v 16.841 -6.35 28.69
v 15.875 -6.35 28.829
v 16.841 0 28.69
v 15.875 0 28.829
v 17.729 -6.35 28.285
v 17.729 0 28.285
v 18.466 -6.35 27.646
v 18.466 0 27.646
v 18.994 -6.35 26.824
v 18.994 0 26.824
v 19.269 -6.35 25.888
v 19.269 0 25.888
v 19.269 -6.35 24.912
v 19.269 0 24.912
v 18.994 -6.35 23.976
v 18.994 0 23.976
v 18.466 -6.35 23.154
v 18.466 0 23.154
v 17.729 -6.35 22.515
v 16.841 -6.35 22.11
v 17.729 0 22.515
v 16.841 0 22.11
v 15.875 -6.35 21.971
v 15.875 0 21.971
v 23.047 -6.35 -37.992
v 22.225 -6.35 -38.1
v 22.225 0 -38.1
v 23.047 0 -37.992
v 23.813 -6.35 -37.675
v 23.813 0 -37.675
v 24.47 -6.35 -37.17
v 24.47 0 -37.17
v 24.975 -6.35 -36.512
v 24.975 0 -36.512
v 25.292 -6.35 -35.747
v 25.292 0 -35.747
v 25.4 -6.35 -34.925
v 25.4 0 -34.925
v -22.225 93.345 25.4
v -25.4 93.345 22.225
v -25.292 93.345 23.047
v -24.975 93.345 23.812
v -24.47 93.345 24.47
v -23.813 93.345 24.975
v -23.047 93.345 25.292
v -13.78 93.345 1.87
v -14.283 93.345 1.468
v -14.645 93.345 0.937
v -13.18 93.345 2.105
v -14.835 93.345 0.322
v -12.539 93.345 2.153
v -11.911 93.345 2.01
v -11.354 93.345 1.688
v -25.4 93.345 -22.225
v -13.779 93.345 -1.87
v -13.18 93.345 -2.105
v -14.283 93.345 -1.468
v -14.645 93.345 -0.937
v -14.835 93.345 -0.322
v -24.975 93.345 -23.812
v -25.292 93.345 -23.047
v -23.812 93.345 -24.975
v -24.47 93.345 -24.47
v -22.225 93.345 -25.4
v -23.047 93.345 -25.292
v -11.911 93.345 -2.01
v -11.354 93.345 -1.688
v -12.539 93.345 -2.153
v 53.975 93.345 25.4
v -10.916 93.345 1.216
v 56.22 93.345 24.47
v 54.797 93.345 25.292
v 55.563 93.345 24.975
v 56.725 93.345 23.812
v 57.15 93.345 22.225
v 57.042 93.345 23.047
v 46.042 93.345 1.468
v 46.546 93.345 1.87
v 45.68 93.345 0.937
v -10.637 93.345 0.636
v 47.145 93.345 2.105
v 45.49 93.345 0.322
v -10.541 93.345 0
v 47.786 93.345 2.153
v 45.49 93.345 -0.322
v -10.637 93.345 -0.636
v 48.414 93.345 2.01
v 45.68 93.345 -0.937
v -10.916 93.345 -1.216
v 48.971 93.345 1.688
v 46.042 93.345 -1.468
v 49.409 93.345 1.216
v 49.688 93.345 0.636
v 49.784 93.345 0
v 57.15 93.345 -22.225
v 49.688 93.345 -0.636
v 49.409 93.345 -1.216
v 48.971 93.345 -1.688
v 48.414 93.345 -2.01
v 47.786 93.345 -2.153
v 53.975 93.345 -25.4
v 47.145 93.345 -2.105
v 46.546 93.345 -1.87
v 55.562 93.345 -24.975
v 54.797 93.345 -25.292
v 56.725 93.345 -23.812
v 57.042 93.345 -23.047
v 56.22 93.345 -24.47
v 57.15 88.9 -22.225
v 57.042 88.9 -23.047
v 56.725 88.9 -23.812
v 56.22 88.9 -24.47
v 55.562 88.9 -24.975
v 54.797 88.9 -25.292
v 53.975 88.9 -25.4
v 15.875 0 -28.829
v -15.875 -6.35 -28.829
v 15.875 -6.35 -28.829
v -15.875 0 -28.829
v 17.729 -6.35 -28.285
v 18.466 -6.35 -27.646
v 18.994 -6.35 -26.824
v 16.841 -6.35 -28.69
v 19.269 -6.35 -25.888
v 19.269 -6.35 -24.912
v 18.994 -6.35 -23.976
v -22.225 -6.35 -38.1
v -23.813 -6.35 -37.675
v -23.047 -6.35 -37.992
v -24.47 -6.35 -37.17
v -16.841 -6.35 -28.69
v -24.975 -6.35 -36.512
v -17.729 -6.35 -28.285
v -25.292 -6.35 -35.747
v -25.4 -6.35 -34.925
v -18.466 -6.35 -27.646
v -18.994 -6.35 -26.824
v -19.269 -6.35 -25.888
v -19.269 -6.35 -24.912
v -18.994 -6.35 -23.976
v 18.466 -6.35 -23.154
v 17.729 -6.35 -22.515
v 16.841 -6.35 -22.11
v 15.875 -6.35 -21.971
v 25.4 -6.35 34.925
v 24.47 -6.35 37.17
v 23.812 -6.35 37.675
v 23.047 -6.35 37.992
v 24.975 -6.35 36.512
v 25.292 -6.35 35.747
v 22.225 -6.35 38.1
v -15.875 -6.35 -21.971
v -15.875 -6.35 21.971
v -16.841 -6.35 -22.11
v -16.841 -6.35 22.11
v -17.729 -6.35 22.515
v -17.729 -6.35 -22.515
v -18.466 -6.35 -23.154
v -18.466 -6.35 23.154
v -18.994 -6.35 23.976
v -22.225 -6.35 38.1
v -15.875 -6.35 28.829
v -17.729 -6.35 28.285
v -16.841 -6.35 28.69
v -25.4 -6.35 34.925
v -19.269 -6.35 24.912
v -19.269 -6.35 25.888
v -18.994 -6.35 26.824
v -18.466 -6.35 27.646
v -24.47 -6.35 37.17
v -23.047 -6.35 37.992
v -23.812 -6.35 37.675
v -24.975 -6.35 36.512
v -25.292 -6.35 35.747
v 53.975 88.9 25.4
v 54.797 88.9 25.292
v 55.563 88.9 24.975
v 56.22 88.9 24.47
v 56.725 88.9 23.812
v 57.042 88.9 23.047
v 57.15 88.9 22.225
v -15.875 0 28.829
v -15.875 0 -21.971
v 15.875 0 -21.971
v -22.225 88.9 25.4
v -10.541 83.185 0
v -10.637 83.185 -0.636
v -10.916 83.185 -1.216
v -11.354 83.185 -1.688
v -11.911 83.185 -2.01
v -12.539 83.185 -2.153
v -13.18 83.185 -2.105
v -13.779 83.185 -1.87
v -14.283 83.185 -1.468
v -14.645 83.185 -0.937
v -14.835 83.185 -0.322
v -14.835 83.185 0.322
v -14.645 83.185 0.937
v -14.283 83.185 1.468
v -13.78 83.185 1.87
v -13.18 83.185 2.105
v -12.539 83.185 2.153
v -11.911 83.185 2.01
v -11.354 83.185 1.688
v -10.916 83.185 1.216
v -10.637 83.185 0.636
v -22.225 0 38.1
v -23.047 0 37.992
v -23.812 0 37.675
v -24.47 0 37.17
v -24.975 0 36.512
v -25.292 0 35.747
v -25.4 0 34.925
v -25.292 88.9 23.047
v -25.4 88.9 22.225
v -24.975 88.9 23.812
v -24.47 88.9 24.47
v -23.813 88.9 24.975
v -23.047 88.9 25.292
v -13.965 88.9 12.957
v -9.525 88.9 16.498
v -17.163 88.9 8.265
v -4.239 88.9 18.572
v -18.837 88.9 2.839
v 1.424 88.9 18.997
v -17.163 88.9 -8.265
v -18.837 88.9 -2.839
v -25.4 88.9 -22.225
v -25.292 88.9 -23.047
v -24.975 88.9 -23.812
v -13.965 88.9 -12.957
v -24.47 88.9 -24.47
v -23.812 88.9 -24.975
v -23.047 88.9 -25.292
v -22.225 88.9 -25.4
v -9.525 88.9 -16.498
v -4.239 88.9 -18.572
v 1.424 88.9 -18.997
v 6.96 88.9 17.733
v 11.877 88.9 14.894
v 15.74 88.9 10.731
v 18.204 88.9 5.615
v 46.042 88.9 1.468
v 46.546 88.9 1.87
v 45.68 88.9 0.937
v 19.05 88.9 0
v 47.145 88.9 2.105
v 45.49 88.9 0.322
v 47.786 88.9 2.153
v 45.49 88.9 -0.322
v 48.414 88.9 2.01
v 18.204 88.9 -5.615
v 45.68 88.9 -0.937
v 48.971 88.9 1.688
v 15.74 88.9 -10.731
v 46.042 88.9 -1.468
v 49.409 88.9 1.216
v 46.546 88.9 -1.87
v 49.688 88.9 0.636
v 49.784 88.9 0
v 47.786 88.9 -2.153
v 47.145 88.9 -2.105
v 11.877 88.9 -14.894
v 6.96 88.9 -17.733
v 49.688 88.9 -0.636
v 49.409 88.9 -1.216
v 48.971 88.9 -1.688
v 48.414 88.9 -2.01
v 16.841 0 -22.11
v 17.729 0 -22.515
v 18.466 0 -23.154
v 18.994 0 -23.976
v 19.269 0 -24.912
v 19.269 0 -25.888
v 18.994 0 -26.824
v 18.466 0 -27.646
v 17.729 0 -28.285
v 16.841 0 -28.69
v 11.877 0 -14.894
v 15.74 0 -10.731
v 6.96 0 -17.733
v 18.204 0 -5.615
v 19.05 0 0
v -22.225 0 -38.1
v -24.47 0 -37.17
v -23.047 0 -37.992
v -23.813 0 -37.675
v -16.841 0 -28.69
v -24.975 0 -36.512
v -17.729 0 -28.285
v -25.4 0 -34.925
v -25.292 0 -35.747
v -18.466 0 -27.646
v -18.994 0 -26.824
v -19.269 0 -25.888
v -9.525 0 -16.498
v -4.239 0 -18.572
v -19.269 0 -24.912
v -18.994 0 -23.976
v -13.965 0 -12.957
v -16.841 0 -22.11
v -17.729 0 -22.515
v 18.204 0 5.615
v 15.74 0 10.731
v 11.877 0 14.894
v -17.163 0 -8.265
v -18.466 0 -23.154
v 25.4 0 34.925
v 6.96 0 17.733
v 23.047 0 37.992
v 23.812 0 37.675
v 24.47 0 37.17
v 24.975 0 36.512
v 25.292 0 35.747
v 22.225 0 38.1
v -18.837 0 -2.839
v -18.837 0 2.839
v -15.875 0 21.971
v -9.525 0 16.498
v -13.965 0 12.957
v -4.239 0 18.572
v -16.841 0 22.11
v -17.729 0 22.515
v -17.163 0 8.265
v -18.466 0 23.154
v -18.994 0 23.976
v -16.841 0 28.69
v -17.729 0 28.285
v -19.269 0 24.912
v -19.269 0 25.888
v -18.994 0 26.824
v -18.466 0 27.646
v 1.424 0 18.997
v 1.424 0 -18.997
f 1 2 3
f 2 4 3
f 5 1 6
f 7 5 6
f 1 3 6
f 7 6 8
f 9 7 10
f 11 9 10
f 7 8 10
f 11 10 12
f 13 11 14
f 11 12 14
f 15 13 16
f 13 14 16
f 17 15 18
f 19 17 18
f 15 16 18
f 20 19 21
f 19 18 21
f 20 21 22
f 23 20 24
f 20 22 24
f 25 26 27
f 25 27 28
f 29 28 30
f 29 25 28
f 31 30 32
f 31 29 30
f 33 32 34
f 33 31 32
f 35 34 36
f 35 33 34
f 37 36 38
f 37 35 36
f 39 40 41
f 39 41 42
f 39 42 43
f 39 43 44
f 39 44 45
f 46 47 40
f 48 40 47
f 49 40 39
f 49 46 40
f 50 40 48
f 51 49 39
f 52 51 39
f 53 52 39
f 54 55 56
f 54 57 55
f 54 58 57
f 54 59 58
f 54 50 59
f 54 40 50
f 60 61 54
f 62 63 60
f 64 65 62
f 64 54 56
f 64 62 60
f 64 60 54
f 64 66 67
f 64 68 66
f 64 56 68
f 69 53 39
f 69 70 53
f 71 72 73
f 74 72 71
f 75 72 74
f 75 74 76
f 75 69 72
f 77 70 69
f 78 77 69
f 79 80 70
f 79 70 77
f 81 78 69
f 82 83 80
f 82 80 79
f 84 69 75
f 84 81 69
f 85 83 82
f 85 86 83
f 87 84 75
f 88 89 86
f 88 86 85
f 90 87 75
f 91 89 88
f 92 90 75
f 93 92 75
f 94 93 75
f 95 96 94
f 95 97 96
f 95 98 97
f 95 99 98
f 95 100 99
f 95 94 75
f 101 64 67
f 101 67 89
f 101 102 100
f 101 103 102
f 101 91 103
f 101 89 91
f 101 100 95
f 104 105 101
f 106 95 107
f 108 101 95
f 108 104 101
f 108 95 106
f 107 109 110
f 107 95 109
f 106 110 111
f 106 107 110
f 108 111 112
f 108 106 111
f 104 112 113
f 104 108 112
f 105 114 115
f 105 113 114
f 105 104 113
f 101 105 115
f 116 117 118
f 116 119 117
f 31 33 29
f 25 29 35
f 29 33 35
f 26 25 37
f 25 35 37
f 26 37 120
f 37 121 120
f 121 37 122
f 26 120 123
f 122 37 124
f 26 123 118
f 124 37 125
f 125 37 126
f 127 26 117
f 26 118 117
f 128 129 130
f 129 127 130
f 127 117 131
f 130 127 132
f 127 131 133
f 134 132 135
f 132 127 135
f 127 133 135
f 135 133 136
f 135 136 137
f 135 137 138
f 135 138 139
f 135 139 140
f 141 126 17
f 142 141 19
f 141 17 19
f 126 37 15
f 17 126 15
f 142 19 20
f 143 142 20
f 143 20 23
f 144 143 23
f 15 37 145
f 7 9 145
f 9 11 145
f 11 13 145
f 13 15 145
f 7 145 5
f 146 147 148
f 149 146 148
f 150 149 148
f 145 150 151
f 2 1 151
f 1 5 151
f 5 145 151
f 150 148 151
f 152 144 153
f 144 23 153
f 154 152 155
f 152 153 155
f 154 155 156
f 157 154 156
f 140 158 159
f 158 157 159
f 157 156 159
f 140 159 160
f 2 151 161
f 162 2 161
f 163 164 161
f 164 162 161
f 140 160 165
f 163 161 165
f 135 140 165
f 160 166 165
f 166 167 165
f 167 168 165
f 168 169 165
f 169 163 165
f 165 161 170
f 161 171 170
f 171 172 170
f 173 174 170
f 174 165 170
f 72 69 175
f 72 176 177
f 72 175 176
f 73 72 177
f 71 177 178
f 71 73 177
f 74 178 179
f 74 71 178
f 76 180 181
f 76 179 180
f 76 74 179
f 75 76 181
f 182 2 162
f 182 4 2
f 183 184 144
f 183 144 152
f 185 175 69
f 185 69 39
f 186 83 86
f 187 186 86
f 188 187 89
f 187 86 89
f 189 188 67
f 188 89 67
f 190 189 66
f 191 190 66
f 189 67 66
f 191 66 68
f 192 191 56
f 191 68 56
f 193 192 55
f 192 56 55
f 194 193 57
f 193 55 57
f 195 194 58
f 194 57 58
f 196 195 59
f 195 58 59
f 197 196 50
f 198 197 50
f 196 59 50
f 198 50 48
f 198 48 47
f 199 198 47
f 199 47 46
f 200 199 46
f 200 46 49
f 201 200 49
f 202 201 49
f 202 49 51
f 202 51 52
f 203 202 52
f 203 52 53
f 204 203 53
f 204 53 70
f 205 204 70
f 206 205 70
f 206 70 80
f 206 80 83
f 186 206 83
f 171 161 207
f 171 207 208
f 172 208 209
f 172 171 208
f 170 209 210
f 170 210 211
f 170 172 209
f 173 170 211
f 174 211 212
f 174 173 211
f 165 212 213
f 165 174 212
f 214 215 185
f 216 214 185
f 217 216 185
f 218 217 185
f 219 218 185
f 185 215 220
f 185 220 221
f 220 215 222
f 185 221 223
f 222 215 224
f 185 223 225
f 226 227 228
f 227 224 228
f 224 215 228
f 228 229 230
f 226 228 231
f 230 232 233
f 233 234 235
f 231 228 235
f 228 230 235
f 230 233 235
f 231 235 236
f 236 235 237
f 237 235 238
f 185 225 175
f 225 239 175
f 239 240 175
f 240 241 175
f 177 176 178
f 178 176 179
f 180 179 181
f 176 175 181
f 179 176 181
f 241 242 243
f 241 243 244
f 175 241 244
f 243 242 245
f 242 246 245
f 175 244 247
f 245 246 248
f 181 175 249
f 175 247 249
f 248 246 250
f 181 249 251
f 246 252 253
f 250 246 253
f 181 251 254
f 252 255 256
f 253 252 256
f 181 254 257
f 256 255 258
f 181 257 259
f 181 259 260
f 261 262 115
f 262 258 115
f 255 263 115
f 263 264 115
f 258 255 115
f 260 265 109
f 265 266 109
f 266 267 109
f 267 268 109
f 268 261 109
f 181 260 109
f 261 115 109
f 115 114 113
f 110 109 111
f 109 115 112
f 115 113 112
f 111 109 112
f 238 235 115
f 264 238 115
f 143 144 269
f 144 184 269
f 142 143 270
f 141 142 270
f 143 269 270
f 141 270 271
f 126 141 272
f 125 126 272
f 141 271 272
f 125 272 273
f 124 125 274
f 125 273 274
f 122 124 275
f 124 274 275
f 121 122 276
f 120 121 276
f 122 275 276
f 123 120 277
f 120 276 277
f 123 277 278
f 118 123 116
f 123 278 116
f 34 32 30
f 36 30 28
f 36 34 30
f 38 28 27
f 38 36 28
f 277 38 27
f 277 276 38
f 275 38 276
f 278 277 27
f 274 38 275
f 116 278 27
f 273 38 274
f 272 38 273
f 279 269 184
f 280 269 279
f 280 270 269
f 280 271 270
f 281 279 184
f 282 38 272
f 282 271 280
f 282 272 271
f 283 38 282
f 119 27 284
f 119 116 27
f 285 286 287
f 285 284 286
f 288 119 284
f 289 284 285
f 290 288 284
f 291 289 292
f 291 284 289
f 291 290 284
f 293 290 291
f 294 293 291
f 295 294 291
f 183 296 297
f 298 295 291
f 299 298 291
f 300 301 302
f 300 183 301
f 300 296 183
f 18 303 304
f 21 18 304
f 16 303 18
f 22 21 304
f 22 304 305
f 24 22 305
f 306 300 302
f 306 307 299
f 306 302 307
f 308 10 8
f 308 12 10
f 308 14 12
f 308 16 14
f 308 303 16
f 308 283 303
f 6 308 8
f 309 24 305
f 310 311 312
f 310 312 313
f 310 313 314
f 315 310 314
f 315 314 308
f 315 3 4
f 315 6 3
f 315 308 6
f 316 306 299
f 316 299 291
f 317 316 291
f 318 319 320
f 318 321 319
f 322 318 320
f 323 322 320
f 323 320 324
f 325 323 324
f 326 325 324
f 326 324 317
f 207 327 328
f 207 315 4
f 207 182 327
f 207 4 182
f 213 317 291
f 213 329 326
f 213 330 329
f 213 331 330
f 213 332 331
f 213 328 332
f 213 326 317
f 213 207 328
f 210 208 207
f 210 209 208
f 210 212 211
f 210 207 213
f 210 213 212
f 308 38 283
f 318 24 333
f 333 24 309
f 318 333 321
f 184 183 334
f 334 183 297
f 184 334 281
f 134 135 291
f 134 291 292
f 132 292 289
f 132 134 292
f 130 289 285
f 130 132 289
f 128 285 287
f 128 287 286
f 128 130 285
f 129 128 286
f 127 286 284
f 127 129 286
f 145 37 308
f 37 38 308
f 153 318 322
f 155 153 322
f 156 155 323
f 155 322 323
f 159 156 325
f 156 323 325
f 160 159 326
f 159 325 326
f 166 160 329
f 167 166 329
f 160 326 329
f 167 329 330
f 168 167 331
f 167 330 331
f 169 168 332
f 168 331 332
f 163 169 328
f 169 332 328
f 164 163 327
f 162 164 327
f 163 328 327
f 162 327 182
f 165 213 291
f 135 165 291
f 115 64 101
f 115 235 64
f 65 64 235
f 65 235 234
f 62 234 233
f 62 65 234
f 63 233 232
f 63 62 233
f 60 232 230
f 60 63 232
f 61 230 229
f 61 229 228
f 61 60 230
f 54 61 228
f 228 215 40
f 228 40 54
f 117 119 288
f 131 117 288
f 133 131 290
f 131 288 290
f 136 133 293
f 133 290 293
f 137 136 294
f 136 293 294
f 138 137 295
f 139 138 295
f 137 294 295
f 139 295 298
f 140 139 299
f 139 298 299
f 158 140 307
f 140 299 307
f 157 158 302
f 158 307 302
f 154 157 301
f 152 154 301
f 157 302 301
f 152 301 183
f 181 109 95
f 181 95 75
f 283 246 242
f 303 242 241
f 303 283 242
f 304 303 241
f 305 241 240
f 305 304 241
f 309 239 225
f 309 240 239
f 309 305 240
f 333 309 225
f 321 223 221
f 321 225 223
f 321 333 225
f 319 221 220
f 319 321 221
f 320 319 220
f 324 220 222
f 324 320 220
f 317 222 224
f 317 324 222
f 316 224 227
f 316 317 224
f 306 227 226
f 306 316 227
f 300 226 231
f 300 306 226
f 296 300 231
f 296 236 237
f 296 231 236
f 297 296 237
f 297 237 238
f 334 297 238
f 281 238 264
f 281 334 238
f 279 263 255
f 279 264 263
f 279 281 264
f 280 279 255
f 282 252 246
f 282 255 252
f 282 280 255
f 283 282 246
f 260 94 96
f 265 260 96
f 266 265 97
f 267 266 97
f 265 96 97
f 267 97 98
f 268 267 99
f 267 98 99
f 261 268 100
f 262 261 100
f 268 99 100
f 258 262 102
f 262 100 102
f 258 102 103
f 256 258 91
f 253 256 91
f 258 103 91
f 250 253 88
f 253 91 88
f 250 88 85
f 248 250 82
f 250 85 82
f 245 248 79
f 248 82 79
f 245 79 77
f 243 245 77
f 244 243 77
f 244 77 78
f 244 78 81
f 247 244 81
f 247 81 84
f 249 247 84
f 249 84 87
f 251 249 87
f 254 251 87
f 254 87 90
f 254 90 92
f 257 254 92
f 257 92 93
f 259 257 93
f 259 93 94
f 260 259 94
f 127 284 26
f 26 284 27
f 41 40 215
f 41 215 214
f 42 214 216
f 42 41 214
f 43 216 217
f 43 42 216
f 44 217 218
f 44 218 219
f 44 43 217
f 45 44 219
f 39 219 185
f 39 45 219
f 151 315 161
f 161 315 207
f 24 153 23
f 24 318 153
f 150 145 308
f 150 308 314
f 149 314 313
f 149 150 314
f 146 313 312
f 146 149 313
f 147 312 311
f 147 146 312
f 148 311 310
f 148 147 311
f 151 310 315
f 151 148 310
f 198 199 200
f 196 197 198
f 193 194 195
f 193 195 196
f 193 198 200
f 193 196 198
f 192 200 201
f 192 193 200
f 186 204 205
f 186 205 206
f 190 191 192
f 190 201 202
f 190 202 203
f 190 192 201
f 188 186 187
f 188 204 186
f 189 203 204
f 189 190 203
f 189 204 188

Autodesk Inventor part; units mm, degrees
ref_plane "YZ Plane" through (0, 0, 0) normal (1, 0, 0) x (0, 1, 0)
ref_plane "XZ Plane" through (0, 0, 0) normal (0, 1, 0) x (-1, 0, 0)
ref_plane "XY Plane" through (0, 0, 0) normal (0, 0, 1) x (1, 0, 0)
sketch "Sketch2" plane through (0, 0, 0) normal (0, 1, 0) x (-1, 0, 0)
  line L0 (-25.4, 38.1) -> (25.4, 38.1)
  line L1 (25.4, 38.1) -> (25.4, -38.1)
  line L2 (25.4, -38.1) -> (-25.4, -38.1)
  line L3 (-25.4, -38.1) -> (-25.4, 38.1)
  point P0 (0, 0)
  dimension "d0" = 50.8
  dimension "d1" = 76.2
  dimension "d2" = 25.4
  dimension "d3" = 38.1
extrude "Extrusion1" add sketch "Sketch2" against normal blind 6.35
sketch "Sketch3" plane through (0, 0, 0) normal (0, 1, 0) x (1, 0, 0)
  circle A0 centre (0, 0) radius 19.05
  dimension "d6" = 38.1
extrude "Extrusion2" add sketch "Sketch3" along normal blind 88.9
sketch "Sketch4" plane through (0, 0, 0) normal (0, 1, 0) x (1, 0, 0)
  circle A0 centre (0, 0) radius 19.05 projected
  line L0 (-15.875, 28.829) -> (15.875, 28.829)
  line L1 (15.875, 28.829) -> (15.875, 21.971)
  line L2 (15.875, 21.971) -> (-15.875, 21.971)
  line L3 (-15.875, 21.971) -> (-15.875, 28.829)
  line L4 (-15.875, -21.971) -> (15.875, -21.971)
  line L5 (15.875, -21.971) -> (15.875, -28.829)
  line L6 (15.875, -28.829) -> (-15.875, -28.829)
  line L7 (-15.875, -28.829) -> (-15.875, -21.971)
  line L8 (-15.875, 25.4) -> (15.875, 25.4)
  line L9 (-15.875, -25.4) -> (15.875, -25.4)
  circle A1 centre (-15.875, 25.4) radius 3.429
  circle A2 centre (15.875, 25.4) radius 3.429
  circle A3 centre (15.875, -25.4) radius 3.429
  circle A4 centre (-15.875, -25.4) radius 3.429
  dimension "d10" = 6.858
  dimension "d11" = 6.858
  dimension "d12" = 25.4
  dimension "d14" = 25.4
  dimension "d15" = 31.75
  dimension "d16" = 31.75
  dimension "d17" = 15.875
  dimension "d18" = 15.875
sketch "Sketch5" plane through (0, 88.9, 0) normal (0, 1, 0) x (1, 0, 0)
  circle A0 centre (0, 0) radius 19.05 projected
  line L0 (-25.4, 25.4) -> (57.15, 25.4)
  line L1 (57.15, 25.4) -> (57.15, -25.4)
  line L2 (57.15, -25.4) -> (-25.4, -25.4)
  line L3 (-25.4, -25.4) -> (-25.4, 25.4)
  dimension "d19" = 50.8
  dimension "d20" = 82.55
  dimension "d21" = 25.4
  dimension "d22" = 25.4
extrude "Extrusion3" add sketch "Sketch5" along normal blind 4.445 contours A0 | L0 L1 L2 L3
sketch "Sketch6" plane through (0, 93.345, 0) normal (0, 1, 0) x (1, 0, 0)
  line L0 (-25.4, -25.4) -> (-25.4, 25.4) projected
  circle A0 centre (-12.7, 0) radius 2.159
  circle A1 centre (47.625, 0) radius 2.159
  point P0 (0, 0)
  dimension "d25" = 4.318
  dimension "d26" = 12.7
  dimension "d27" = 4.318
  dimension "d28" = 60.325
extrude "Extrusion4" cut sketch "Sketch6" against normal blind 10.16
extrude "Extrusion5" cut sketch "Sketch4" against normal blind 6.35 contours A1 L8 L3 | L0 A2 L8 A1 | L3 A1 | A2 L1 | L1 L8 A2 | L8 A1 L3 | L8 A2 L2 A1 | L1 A2 L8 | A4 L9 L7 | L4 A3 L9 A4 | L7 A4 | A3 L5 | L5 L9 A3 | L9 A4 L7 | L9 A3 L6 A4 | L5 A3 L9
fillet "Fillet1" radius 3.175 8 edges at (-25.4, -3.175, 38.1) (25.4, -3.175, 38.1) (25.4, -3.175, -38.1) (-25.4, -3.175, -38.1) (57.15, 91.1225, -25.4) (-25.4, 91.1225, -25.4) (57.15, 91.1225, 25.4) (-25.4, 91.1225, 25.4)
sketch "Sketch7" plane through (0, 93.345, 0) normal (0, 1, 0) x (1, 0, 0)
  arc A0 (-25.4, -22.225) -> (-22.225, -25.4) centre (-22.225, -22.225) ccw projected
  line L0 (53.975, -25.4) -> (-22.225, -25.4) projected
  arc A1 (53.975, -25.4) -> (57.15, -22.225) centre (53.975, -22.225) ccw projected
  line L1 (57.15, 22.225) -> (57.15, -22.225) projected
  arc A2 (57.15, 22.225) -> (53.975, 25.4) centre (53.975, 22.225) ccw projected
  line L2 (-22.225, 25.4) -> (53.975, 25.4) projected
  arc A3 (-22.225, 25.4) -> (-25.4, 22.225) centre (-22.225, 22.225) ccw projected
  line L3 (-25.4, -22.225) -> (-25.4, 22.225) projected
  circle A4 centre (47.625, 0) radius 2.159 projected
  circle A5 centre (-12.7, 0) radius 2.159 projected
  point P0 (0, 0)
  dimension "d34" = 60.325
thread "Thread1" size "10-24 UNC" class "2B" standard "ANSI Unified Screw Threads" full length
equation "\"d3\" = 0.5 * d1"
equation "\"d16\" = d15"
equation "\"d17\" = 0.5 * d15"
equation "\"d18\" = d17"
equation "\"d22\" = 0.5 * d19"
properties part number "Lickport_Stand"
